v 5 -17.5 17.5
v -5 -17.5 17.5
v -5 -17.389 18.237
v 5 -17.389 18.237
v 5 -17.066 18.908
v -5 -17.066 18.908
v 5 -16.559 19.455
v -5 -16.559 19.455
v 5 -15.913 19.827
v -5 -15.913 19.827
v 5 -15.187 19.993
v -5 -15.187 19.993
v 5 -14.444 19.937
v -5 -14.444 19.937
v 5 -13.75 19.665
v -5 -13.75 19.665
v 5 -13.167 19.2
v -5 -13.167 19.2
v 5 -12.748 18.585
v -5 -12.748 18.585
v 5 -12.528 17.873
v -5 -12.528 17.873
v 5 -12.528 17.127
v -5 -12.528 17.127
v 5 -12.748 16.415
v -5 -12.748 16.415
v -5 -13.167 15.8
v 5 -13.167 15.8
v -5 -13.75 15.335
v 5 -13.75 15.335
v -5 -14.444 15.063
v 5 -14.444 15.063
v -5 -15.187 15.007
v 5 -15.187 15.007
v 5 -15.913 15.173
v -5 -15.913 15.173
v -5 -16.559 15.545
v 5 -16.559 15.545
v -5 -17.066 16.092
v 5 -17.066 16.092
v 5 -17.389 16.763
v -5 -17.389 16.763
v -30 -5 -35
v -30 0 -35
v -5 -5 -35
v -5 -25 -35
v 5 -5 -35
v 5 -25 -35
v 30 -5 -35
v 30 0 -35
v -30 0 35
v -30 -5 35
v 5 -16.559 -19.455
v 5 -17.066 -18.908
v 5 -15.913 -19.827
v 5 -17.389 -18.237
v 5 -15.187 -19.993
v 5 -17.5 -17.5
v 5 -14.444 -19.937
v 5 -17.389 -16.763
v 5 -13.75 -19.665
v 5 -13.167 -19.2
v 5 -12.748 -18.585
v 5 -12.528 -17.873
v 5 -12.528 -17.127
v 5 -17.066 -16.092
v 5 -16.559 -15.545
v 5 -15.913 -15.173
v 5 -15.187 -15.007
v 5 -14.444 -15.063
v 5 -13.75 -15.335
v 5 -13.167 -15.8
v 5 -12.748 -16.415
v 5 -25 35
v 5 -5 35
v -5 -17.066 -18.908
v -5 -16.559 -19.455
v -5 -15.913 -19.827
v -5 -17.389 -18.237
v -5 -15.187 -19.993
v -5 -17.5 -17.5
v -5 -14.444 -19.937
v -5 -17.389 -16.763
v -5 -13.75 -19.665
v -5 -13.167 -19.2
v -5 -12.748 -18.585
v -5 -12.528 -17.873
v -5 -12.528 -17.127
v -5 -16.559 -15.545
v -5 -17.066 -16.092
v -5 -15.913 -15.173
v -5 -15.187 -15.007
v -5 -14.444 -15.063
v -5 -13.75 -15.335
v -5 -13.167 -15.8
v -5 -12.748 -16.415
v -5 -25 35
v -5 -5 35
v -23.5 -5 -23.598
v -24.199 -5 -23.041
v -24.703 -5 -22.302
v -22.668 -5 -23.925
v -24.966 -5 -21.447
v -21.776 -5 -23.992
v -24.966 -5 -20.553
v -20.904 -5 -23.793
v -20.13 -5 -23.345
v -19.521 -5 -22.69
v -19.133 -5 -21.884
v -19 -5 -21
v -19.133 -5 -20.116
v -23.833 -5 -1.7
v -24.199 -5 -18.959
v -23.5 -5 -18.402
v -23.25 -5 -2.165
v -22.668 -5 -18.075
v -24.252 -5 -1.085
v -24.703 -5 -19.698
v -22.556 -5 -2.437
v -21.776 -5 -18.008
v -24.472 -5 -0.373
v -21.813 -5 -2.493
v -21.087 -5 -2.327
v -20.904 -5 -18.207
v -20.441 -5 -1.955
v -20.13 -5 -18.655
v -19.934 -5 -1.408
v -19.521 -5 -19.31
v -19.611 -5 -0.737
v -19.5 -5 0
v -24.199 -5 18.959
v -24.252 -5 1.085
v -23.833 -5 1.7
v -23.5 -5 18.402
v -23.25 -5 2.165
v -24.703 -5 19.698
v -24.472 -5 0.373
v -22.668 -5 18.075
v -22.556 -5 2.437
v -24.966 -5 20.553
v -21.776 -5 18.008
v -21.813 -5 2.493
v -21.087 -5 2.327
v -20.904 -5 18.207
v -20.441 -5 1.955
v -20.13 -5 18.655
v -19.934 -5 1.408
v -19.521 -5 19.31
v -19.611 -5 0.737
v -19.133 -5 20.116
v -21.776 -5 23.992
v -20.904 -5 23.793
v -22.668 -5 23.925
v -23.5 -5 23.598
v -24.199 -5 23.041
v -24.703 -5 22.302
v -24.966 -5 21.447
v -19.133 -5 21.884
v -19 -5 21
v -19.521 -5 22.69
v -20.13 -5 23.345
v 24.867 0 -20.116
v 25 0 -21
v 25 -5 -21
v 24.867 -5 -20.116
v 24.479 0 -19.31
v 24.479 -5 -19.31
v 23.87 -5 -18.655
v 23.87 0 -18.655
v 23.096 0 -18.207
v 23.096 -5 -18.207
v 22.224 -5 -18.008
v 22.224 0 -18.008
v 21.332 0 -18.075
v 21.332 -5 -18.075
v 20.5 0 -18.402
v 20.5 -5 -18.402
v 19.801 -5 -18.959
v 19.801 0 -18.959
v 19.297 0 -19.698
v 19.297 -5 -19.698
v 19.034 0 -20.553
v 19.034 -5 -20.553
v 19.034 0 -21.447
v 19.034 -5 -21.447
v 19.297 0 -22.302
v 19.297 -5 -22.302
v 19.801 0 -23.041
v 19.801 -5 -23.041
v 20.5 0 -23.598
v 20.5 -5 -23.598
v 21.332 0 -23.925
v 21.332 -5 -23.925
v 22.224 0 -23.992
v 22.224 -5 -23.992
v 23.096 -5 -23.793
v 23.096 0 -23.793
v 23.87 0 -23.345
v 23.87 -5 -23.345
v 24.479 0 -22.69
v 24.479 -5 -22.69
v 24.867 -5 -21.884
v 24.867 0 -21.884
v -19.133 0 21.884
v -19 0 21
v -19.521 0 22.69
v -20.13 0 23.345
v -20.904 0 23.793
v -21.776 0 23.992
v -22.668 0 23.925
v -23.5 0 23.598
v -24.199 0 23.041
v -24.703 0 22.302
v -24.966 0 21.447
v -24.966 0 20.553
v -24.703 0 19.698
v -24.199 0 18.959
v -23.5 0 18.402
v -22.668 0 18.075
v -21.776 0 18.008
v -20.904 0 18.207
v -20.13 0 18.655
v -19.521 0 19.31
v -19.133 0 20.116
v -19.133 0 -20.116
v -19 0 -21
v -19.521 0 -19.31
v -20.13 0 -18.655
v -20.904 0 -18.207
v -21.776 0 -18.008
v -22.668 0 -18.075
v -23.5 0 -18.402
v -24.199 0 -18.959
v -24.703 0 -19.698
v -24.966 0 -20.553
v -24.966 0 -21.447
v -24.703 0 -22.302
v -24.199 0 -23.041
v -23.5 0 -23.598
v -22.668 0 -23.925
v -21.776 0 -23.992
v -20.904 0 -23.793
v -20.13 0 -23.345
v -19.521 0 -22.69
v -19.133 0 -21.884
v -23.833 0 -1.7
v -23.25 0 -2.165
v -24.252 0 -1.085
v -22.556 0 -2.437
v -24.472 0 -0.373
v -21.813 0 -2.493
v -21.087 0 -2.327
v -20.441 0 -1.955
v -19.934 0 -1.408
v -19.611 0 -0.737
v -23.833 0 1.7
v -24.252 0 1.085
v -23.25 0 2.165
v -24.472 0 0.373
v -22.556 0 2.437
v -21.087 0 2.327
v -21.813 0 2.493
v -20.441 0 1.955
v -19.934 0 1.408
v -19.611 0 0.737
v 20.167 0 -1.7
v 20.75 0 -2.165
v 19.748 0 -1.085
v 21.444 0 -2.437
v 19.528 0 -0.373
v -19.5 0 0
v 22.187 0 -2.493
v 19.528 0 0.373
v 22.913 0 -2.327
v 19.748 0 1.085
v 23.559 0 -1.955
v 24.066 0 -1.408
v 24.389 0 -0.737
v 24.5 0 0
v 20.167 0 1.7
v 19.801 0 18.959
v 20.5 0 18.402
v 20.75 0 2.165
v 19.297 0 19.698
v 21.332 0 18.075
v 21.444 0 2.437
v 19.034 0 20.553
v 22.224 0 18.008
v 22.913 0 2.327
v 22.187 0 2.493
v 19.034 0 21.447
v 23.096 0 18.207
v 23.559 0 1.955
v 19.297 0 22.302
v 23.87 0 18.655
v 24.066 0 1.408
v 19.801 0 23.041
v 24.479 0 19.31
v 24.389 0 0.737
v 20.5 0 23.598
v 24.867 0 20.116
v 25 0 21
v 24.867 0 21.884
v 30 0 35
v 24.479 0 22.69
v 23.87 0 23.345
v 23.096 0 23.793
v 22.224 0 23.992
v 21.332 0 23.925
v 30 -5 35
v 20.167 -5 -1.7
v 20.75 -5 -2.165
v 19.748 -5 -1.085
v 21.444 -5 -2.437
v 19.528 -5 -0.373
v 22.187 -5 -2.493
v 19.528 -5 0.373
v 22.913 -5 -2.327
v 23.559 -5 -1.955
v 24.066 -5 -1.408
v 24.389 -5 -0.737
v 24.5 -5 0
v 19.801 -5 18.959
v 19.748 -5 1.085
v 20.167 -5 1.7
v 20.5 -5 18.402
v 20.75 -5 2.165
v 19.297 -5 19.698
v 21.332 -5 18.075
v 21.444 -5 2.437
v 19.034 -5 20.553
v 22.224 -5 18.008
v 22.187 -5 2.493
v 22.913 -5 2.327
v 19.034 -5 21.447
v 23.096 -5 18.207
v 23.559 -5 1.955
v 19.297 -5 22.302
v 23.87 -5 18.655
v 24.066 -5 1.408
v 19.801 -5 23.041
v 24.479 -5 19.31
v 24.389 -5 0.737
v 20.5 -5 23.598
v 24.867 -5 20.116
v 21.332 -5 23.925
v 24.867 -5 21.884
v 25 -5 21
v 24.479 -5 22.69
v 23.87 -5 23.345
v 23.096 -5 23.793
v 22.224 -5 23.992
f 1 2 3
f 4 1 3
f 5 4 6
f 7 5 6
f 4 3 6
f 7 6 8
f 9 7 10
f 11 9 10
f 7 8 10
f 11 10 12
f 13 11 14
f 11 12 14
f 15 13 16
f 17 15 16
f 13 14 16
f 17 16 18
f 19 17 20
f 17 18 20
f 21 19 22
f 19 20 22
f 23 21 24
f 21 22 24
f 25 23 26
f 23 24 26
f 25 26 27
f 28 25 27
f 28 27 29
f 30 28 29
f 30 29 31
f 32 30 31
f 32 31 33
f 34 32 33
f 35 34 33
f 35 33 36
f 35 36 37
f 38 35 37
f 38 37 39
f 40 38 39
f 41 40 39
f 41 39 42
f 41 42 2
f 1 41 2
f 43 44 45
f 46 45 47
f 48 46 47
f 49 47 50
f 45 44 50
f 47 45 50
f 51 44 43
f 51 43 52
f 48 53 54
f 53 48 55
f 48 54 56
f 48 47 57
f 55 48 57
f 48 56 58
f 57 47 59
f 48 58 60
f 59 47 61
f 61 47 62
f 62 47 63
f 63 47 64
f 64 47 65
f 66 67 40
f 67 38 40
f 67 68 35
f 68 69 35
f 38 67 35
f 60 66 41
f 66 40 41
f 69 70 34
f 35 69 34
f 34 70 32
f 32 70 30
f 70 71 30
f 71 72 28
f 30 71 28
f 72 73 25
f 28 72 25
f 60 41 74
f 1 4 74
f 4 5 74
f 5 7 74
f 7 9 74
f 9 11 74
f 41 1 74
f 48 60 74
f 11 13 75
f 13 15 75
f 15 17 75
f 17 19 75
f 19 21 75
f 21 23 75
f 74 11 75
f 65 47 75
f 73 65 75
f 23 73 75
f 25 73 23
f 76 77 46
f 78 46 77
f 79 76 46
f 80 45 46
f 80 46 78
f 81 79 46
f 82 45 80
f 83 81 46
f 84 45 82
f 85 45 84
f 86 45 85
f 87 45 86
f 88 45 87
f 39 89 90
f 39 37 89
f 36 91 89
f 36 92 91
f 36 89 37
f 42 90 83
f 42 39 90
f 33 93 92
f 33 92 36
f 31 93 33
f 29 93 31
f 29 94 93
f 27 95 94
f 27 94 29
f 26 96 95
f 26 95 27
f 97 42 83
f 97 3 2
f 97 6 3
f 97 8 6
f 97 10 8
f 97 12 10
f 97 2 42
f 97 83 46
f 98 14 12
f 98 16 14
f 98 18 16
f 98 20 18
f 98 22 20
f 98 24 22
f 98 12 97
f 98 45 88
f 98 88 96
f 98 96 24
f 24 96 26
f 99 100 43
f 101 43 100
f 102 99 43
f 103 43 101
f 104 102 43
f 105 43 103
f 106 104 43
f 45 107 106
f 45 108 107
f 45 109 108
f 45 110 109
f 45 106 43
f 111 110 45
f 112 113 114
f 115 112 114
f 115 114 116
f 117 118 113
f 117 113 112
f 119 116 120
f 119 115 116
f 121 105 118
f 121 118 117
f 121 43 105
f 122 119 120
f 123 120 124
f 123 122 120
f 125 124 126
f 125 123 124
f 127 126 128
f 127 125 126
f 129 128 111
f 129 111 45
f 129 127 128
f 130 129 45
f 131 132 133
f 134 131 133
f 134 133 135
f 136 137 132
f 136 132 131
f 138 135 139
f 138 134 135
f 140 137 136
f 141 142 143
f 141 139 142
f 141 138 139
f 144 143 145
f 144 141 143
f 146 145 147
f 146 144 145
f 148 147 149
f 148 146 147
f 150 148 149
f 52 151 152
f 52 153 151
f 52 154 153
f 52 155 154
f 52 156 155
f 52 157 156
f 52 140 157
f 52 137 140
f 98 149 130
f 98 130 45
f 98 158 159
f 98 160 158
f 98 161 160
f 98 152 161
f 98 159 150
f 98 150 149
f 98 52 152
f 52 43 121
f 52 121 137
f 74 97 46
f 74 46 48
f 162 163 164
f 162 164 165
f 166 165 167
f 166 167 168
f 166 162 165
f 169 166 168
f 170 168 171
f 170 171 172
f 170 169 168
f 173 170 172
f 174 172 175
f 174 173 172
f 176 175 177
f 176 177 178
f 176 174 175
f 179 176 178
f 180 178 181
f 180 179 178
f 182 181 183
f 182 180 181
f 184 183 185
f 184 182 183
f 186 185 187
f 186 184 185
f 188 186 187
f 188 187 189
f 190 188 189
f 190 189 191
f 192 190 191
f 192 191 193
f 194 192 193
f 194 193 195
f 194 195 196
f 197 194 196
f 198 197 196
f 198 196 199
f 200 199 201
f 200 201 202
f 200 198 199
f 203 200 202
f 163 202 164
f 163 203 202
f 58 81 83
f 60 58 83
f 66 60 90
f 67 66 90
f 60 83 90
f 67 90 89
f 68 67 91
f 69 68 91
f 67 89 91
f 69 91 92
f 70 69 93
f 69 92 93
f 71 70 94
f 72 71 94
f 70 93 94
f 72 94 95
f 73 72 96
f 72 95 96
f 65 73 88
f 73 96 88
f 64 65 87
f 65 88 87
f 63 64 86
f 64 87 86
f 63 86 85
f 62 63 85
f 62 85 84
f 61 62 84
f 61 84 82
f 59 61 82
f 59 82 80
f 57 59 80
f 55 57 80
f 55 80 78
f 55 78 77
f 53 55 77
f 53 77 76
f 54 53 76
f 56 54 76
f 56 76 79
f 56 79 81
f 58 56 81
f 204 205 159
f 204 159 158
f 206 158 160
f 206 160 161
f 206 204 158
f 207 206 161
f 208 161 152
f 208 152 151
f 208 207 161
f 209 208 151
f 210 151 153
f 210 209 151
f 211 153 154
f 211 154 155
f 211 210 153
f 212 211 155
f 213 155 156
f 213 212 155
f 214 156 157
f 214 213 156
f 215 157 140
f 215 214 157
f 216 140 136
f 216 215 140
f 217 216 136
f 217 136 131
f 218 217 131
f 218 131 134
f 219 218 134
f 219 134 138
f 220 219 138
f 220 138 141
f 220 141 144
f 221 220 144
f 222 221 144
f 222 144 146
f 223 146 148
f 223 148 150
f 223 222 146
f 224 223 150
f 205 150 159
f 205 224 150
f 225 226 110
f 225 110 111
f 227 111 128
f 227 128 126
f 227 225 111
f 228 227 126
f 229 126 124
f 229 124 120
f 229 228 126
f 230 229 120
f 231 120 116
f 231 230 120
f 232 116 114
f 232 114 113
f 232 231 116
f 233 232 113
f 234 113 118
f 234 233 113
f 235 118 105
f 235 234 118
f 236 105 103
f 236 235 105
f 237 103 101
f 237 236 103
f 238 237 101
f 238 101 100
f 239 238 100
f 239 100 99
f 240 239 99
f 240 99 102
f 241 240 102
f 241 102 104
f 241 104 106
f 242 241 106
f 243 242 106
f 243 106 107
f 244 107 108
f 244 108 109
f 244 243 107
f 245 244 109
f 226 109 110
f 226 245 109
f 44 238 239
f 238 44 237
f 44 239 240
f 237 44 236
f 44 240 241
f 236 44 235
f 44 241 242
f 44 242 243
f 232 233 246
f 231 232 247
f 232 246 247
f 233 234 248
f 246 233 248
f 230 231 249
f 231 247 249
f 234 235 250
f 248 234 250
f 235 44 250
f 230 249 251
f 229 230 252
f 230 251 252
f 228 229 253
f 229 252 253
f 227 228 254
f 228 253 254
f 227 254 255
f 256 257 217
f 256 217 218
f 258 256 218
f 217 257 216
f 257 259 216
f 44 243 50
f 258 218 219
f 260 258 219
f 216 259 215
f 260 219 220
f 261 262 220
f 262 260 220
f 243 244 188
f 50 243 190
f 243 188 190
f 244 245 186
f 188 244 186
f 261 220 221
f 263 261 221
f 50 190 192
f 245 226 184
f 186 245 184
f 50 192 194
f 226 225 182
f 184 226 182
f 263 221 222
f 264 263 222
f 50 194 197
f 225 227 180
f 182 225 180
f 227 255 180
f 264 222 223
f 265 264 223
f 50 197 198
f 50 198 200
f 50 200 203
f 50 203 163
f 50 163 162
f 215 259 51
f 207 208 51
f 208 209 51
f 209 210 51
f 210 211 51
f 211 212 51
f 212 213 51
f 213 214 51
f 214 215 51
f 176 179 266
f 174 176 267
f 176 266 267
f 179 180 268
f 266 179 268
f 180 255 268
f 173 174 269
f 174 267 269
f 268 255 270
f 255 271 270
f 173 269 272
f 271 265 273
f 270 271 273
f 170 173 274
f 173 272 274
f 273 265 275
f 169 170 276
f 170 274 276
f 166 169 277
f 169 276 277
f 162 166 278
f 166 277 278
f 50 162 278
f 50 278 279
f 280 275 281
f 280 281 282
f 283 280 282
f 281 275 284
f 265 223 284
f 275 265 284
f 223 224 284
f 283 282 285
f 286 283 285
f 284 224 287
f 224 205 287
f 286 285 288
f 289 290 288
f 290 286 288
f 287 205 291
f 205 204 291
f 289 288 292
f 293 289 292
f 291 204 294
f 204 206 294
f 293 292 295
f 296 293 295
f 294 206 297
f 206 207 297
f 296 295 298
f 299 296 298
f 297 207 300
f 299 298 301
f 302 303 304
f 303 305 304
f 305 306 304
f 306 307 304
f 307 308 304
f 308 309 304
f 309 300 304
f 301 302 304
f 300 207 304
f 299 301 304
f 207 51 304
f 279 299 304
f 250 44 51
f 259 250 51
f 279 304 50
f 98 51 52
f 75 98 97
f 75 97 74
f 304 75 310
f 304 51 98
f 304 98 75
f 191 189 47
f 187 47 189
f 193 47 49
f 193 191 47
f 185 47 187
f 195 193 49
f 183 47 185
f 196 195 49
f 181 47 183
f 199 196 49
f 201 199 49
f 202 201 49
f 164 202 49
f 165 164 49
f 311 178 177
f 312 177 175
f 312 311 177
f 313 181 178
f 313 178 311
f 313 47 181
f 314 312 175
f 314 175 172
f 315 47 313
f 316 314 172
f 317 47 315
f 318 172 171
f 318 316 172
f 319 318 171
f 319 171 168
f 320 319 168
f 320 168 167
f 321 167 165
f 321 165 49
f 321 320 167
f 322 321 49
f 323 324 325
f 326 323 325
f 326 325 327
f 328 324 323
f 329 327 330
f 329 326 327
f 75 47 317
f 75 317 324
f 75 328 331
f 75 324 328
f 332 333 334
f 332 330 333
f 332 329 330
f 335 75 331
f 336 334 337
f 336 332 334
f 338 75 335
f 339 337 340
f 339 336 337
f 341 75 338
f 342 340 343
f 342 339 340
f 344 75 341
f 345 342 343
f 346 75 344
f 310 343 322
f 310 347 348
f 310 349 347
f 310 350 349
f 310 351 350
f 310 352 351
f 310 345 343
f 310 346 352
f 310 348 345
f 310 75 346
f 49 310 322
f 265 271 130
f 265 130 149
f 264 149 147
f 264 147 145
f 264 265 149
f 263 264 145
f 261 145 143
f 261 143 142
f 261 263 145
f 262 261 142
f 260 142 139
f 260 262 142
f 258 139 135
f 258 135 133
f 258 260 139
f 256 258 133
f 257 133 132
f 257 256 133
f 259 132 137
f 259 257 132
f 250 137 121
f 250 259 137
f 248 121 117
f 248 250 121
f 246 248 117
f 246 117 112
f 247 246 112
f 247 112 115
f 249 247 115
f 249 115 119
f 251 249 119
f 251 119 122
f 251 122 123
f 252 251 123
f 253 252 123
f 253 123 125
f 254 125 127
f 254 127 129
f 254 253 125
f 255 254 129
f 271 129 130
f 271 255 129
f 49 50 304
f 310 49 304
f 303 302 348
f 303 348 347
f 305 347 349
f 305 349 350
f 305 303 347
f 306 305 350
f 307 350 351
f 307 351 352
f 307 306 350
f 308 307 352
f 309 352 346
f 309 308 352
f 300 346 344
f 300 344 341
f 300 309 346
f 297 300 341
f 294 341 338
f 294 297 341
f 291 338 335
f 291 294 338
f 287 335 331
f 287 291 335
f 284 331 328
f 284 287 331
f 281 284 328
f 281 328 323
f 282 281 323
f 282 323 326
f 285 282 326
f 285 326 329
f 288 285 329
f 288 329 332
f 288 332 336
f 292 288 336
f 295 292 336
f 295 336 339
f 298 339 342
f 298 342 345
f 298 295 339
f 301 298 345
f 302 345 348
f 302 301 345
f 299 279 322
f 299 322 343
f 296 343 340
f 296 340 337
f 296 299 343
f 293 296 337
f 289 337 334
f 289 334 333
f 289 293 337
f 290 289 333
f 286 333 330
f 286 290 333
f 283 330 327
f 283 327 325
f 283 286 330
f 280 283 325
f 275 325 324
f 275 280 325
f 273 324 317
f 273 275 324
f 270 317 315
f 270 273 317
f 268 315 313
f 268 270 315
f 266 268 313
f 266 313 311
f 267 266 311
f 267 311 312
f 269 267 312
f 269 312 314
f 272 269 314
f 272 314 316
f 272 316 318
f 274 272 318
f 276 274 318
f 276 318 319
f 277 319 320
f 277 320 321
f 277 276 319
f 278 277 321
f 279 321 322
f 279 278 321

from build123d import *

# Parameters (mm, degrees)
F0_W     = 60
F0_H     = 70
F0_R     = 3
F0_R_2   = 2.5
F1_DEPTH = 5
F2_W     = 10
F2_H     = 70
F3_DEPTH = 20
F5_D     = 5
F5_DEPTH = 40


with BuildPart() as f1:
    # F0 (on Front) → F1 (new body)
    with BuildSketch(Plane.XZ):
        Rectangle(F0_W, F0_H)
        with Locations((-22, -21)):
            Circle(F0_R, mode=Mode.SUBTRACT)
        with Locations((22, -21)):
            Circle(F0_R, mode=Mode.SUBTRACT)
        with Locations((-22, 0)):
            Circle(F0_R_2, mode=Mode.SUBTRACT)
        with Locations((-22, 21)):
            Circle(F0_R, mode=Mode.SUBTRACT)
        with Locations((22, 0)):
            Circle(F0_R_2, mode=Mode.SUBTRACT)
        with Locations((22, 21)):
            Circle(F0_R, mode=Mode.SUBTRACT)
    extrude(amount=F1_DEPTH)

    # F2 (on face) → F3 (join)
    with BuildSketch(Plane.XZ.offset(5)):
        Rectangle(F2_W, F2_H)
    extrude(amount=F3_DEPTH)

    # F5
    with Locations(Plane.YZ.offset(5)):
        with Locations((-15, 17.5), (-15, -17.5)):
            Hole(F5_D / 2, depth=F5_DEPTH)


solid = f1.part
